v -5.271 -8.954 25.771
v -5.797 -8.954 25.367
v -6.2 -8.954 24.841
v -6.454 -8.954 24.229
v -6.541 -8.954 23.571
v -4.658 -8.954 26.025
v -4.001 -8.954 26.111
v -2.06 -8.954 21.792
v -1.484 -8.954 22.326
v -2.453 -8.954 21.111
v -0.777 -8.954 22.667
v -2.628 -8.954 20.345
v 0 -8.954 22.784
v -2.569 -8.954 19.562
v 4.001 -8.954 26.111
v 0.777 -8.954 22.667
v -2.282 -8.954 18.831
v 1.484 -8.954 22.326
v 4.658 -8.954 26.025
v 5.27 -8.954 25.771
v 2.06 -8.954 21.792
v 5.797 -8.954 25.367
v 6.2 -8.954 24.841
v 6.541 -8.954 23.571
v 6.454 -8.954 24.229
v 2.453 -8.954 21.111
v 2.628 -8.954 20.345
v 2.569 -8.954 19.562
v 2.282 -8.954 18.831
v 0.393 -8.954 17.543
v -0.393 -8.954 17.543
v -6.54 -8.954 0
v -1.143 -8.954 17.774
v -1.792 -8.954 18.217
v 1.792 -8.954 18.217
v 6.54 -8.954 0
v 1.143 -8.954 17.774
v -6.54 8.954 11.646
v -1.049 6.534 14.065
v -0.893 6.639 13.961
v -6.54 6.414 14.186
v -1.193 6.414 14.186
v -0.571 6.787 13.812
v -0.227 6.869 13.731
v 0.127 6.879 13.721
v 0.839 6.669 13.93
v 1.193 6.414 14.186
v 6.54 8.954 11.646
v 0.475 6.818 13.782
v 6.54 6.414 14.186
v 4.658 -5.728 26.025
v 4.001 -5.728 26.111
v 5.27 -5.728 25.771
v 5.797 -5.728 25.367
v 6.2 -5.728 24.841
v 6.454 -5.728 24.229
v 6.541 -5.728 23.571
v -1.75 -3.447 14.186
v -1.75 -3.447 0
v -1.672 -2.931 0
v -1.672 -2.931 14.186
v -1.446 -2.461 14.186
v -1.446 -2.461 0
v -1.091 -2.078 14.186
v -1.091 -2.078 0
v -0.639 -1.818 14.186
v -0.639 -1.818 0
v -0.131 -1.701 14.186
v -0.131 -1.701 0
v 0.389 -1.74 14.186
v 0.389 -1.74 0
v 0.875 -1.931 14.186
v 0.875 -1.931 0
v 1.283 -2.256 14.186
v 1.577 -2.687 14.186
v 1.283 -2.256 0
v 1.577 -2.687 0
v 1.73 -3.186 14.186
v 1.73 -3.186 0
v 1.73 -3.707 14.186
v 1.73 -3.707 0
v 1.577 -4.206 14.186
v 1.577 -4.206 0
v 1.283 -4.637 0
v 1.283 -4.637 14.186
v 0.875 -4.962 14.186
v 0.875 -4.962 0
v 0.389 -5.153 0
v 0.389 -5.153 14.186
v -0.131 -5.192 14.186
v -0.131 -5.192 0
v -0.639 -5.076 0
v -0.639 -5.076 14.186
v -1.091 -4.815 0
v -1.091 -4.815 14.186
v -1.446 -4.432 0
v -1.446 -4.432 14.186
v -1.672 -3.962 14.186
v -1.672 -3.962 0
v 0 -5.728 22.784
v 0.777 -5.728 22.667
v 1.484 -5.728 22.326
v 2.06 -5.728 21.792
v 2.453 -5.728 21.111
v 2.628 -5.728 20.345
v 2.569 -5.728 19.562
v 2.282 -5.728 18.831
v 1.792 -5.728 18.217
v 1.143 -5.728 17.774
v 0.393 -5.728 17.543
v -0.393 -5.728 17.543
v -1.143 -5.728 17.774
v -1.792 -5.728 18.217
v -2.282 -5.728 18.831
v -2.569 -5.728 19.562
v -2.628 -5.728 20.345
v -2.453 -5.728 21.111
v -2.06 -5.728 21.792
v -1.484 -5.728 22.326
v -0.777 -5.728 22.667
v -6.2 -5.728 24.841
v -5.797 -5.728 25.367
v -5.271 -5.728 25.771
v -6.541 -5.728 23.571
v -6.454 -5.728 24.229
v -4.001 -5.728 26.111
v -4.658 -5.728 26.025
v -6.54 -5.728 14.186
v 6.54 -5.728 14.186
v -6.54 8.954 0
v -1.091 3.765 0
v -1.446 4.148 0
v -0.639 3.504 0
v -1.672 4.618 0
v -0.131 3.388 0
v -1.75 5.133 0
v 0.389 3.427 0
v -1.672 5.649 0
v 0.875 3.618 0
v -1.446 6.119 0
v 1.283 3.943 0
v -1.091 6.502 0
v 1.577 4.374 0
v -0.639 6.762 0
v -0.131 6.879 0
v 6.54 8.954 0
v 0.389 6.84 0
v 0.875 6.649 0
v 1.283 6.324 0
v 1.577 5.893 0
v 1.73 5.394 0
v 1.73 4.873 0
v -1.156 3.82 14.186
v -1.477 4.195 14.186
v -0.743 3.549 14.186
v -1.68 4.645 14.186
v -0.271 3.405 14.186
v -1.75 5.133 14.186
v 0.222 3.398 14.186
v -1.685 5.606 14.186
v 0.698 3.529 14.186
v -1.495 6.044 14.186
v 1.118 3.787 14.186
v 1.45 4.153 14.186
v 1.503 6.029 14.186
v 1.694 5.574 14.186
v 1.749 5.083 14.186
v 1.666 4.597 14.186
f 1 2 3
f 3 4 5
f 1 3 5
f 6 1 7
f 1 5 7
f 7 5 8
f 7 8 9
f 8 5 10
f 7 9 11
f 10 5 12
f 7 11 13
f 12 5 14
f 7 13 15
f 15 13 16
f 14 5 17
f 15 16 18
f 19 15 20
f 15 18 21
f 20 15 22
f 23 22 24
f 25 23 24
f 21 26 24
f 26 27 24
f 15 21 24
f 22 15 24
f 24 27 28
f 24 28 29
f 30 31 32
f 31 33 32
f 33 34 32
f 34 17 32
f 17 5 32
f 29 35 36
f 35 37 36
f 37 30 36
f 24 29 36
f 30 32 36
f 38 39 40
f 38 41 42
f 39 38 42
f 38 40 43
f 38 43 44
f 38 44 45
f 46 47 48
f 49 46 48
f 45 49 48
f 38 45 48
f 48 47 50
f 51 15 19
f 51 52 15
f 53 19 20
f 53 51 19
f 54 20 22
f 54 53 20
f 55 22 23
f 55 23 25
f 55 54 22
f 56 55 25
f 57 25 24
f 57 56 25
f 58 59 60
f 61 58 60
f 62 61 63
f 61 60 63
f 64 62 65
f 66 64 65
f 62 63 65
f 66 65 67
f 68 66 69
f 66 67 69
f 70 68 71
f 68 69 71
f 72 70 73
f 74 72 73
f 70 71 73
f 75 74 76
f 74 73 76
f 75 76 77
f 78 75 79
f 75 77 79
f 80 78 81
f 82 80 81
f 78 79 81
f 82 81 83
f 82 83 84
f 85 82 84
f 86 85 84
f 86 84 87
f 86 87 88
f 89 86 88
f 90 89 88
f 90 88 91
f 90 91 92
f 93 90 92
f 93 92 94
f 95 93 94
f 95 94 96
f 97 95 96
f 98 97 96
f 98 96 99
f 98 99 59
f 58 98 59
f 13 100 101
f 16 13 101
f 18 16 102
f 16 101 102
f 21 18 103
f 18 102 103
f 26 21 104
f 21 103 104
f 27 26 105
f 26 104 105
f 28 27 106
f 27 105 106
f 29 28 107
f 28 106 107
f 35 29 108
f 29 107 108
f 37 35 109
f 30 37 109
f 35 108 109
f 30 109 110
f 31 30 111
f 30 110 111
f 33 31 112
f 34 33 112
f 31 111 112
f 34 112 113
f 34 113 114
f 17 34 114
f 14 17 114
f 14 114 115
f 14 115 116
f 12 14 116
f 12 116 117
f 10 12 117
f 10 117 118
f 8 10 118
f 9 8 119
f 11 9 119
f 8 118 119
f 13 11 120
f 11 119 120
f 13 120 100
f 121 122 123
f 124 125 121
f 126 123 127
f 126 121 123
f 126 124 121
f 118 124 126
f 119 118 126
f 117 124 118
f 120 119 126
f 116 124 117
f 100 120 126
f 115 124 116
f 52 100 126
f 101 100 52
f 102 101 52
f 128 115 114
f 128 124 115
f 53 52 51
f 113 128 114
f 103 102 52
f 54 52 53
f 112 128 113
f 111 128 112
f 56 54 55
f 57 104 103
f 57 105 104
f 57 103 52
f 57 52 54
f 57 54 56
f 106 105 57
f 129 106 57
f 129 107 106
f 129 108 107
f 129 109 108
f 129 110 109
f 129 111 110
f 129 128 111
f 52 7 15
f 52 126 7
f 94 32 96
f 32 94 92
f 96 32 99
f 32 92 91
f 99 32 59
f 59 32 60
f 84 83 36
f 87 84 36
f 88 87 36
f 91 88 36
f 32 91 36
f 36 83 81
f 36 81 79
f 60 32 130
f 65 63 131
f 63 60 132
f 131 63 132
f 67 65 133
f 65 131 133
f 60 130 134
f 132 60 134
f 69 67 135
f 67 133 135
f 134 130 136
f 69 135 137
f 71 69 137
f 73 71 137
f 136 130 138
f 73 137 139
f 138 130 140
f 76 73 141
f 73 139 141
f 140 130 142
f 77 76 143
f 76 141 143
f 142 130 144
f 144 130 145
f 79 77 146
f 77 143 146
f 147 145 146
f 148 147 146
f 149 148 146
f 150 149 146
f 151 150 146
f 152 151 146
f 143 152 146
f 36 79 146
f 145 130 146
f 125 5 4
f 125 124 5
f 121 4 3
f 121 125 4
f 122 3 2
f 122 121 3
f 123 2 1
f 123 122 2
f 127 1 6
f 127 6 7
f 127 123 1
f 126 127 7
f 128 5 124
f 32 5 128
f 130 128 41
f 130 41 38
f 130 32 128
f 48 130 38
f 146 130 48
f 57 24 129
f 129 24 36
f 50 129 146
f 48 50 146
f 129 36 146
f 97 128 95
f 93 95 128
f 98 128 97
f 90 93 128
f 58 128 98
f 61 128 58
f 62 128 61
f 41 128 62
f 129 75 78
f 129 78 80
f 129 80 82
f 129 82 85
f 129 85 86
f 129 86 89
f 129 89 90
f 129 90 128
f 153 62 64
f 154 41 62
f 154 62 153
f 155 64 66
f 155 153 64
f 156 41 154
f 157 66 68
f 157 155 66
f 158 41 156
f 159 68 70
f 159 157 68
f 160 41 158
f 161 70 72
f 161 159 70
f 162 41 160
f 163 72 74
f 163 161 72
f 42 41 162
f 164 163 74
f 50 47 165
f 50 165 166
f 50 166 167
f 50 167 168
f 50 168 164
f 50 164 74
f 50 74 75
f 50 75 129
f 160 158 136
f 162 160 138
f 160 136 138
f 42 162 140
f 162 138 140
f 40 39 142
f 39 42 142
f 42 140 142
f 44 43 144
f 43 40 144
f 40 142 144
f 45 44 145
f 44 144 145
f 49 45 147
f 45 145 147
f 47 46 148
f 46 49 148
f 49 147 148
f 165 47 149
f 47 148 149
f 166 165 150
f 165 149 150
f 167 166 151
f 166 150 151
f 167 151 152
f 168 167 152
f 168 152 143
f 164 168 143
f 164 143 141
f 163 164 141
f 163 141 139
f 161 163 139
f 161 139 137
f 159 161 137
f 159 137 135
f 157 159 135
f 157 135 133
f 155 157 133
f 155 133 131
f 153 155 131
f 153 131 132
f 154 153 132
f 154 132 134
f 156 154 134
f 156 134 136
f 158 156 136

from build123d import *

# Parameters (mm, degrees)
SKETCH1_W           = 13.081
SKETCH1_H           = 17.907
BOSS_EXTRUDE1_DEPTH = 14.1859
SKETCH2_W           = 13.081
SKETCH2_H           = 3.2258
BOSS_EXTRUDE2_DEPTH = 11.9253
CHAMFER1_SIZE       = 2.54
FILLET1_R           = 2.54
SKETCH3_R           = 2.63525
CUT_EXTRUDE1_DEPTH  = 3.2258
SKETCH4_R           = 1.75
CUT_EXTRUDE2_DEPTH  = 29.367905597


with BuildPart() as part:
    # Sketch1 → Boss-Extrude1 (new body)
    with BuildSketch(Plane.XY):
        Rectangle(SKETCH1_W, SKETCH1_H)
    extrude(amount=BOSS_EXTRUDE1_DEPTH)

    # Sketch2 → Boss-Extrude2 (add)
    with BuildSketch(Plane.XY.offset(14.1859)):
        with Locations((0, -7.3406)):
            Rectangle(SKETCH2_W, SKETCH2_H)
    extrude(amount=BOSS_EXTRUDE2_DEPTH)

    # Chamfer1
    chamfer1_edges = [part.edges().sort_by_distance(p)[0] for p in [
        (0, 8.9535, 14.1859),
    ]]
    chamfer(chamfer1_edges, length=CHAMFER1_SIZE)

    # Fillet1
    fillet1_edges = [part.edges().sort_by_distance(p)[0] for p in [
        (-6.5405, -7.3406, 26.1112),
        (6.5405, -7.3406, 26.1112),
    ]]
    fillet(fillet1_edges, radius=FILLET1_R)

    # Sketch3 → Cut-Extrude1 (cut)
    with BuildSketch(Plane(origin=(0, -5.7277, 0), x_dir=(1, 0, 0), z_dir=(0, 1, 0))):
        with Locations(Location((0, -20.14855, 0), (0, 0, 270))):
            Circle(SKETCH3_R)
    extrude(amount=-CUT_EXTRUDE1_DEPTH, mode=Mode.SUBTRACT)

    # Sketch4 → Cut-Extrude2 (cut, through all)
    with BuildSketch(Plane(origin=(0, 0, 0), x_dir=(-1, 0, 0), z_dir=(0, 0, -1))):
        with Locations((0, 5.1334)):
            Circle(SKETCH4_R)
        with Locations((0, -3.4466)):
            Circle(SKETCH4_R)
    extrude(amount=-CUT_EXTRUDE2_DEPTH, mode=Mode.SUBTRACT)


solid = part.part
